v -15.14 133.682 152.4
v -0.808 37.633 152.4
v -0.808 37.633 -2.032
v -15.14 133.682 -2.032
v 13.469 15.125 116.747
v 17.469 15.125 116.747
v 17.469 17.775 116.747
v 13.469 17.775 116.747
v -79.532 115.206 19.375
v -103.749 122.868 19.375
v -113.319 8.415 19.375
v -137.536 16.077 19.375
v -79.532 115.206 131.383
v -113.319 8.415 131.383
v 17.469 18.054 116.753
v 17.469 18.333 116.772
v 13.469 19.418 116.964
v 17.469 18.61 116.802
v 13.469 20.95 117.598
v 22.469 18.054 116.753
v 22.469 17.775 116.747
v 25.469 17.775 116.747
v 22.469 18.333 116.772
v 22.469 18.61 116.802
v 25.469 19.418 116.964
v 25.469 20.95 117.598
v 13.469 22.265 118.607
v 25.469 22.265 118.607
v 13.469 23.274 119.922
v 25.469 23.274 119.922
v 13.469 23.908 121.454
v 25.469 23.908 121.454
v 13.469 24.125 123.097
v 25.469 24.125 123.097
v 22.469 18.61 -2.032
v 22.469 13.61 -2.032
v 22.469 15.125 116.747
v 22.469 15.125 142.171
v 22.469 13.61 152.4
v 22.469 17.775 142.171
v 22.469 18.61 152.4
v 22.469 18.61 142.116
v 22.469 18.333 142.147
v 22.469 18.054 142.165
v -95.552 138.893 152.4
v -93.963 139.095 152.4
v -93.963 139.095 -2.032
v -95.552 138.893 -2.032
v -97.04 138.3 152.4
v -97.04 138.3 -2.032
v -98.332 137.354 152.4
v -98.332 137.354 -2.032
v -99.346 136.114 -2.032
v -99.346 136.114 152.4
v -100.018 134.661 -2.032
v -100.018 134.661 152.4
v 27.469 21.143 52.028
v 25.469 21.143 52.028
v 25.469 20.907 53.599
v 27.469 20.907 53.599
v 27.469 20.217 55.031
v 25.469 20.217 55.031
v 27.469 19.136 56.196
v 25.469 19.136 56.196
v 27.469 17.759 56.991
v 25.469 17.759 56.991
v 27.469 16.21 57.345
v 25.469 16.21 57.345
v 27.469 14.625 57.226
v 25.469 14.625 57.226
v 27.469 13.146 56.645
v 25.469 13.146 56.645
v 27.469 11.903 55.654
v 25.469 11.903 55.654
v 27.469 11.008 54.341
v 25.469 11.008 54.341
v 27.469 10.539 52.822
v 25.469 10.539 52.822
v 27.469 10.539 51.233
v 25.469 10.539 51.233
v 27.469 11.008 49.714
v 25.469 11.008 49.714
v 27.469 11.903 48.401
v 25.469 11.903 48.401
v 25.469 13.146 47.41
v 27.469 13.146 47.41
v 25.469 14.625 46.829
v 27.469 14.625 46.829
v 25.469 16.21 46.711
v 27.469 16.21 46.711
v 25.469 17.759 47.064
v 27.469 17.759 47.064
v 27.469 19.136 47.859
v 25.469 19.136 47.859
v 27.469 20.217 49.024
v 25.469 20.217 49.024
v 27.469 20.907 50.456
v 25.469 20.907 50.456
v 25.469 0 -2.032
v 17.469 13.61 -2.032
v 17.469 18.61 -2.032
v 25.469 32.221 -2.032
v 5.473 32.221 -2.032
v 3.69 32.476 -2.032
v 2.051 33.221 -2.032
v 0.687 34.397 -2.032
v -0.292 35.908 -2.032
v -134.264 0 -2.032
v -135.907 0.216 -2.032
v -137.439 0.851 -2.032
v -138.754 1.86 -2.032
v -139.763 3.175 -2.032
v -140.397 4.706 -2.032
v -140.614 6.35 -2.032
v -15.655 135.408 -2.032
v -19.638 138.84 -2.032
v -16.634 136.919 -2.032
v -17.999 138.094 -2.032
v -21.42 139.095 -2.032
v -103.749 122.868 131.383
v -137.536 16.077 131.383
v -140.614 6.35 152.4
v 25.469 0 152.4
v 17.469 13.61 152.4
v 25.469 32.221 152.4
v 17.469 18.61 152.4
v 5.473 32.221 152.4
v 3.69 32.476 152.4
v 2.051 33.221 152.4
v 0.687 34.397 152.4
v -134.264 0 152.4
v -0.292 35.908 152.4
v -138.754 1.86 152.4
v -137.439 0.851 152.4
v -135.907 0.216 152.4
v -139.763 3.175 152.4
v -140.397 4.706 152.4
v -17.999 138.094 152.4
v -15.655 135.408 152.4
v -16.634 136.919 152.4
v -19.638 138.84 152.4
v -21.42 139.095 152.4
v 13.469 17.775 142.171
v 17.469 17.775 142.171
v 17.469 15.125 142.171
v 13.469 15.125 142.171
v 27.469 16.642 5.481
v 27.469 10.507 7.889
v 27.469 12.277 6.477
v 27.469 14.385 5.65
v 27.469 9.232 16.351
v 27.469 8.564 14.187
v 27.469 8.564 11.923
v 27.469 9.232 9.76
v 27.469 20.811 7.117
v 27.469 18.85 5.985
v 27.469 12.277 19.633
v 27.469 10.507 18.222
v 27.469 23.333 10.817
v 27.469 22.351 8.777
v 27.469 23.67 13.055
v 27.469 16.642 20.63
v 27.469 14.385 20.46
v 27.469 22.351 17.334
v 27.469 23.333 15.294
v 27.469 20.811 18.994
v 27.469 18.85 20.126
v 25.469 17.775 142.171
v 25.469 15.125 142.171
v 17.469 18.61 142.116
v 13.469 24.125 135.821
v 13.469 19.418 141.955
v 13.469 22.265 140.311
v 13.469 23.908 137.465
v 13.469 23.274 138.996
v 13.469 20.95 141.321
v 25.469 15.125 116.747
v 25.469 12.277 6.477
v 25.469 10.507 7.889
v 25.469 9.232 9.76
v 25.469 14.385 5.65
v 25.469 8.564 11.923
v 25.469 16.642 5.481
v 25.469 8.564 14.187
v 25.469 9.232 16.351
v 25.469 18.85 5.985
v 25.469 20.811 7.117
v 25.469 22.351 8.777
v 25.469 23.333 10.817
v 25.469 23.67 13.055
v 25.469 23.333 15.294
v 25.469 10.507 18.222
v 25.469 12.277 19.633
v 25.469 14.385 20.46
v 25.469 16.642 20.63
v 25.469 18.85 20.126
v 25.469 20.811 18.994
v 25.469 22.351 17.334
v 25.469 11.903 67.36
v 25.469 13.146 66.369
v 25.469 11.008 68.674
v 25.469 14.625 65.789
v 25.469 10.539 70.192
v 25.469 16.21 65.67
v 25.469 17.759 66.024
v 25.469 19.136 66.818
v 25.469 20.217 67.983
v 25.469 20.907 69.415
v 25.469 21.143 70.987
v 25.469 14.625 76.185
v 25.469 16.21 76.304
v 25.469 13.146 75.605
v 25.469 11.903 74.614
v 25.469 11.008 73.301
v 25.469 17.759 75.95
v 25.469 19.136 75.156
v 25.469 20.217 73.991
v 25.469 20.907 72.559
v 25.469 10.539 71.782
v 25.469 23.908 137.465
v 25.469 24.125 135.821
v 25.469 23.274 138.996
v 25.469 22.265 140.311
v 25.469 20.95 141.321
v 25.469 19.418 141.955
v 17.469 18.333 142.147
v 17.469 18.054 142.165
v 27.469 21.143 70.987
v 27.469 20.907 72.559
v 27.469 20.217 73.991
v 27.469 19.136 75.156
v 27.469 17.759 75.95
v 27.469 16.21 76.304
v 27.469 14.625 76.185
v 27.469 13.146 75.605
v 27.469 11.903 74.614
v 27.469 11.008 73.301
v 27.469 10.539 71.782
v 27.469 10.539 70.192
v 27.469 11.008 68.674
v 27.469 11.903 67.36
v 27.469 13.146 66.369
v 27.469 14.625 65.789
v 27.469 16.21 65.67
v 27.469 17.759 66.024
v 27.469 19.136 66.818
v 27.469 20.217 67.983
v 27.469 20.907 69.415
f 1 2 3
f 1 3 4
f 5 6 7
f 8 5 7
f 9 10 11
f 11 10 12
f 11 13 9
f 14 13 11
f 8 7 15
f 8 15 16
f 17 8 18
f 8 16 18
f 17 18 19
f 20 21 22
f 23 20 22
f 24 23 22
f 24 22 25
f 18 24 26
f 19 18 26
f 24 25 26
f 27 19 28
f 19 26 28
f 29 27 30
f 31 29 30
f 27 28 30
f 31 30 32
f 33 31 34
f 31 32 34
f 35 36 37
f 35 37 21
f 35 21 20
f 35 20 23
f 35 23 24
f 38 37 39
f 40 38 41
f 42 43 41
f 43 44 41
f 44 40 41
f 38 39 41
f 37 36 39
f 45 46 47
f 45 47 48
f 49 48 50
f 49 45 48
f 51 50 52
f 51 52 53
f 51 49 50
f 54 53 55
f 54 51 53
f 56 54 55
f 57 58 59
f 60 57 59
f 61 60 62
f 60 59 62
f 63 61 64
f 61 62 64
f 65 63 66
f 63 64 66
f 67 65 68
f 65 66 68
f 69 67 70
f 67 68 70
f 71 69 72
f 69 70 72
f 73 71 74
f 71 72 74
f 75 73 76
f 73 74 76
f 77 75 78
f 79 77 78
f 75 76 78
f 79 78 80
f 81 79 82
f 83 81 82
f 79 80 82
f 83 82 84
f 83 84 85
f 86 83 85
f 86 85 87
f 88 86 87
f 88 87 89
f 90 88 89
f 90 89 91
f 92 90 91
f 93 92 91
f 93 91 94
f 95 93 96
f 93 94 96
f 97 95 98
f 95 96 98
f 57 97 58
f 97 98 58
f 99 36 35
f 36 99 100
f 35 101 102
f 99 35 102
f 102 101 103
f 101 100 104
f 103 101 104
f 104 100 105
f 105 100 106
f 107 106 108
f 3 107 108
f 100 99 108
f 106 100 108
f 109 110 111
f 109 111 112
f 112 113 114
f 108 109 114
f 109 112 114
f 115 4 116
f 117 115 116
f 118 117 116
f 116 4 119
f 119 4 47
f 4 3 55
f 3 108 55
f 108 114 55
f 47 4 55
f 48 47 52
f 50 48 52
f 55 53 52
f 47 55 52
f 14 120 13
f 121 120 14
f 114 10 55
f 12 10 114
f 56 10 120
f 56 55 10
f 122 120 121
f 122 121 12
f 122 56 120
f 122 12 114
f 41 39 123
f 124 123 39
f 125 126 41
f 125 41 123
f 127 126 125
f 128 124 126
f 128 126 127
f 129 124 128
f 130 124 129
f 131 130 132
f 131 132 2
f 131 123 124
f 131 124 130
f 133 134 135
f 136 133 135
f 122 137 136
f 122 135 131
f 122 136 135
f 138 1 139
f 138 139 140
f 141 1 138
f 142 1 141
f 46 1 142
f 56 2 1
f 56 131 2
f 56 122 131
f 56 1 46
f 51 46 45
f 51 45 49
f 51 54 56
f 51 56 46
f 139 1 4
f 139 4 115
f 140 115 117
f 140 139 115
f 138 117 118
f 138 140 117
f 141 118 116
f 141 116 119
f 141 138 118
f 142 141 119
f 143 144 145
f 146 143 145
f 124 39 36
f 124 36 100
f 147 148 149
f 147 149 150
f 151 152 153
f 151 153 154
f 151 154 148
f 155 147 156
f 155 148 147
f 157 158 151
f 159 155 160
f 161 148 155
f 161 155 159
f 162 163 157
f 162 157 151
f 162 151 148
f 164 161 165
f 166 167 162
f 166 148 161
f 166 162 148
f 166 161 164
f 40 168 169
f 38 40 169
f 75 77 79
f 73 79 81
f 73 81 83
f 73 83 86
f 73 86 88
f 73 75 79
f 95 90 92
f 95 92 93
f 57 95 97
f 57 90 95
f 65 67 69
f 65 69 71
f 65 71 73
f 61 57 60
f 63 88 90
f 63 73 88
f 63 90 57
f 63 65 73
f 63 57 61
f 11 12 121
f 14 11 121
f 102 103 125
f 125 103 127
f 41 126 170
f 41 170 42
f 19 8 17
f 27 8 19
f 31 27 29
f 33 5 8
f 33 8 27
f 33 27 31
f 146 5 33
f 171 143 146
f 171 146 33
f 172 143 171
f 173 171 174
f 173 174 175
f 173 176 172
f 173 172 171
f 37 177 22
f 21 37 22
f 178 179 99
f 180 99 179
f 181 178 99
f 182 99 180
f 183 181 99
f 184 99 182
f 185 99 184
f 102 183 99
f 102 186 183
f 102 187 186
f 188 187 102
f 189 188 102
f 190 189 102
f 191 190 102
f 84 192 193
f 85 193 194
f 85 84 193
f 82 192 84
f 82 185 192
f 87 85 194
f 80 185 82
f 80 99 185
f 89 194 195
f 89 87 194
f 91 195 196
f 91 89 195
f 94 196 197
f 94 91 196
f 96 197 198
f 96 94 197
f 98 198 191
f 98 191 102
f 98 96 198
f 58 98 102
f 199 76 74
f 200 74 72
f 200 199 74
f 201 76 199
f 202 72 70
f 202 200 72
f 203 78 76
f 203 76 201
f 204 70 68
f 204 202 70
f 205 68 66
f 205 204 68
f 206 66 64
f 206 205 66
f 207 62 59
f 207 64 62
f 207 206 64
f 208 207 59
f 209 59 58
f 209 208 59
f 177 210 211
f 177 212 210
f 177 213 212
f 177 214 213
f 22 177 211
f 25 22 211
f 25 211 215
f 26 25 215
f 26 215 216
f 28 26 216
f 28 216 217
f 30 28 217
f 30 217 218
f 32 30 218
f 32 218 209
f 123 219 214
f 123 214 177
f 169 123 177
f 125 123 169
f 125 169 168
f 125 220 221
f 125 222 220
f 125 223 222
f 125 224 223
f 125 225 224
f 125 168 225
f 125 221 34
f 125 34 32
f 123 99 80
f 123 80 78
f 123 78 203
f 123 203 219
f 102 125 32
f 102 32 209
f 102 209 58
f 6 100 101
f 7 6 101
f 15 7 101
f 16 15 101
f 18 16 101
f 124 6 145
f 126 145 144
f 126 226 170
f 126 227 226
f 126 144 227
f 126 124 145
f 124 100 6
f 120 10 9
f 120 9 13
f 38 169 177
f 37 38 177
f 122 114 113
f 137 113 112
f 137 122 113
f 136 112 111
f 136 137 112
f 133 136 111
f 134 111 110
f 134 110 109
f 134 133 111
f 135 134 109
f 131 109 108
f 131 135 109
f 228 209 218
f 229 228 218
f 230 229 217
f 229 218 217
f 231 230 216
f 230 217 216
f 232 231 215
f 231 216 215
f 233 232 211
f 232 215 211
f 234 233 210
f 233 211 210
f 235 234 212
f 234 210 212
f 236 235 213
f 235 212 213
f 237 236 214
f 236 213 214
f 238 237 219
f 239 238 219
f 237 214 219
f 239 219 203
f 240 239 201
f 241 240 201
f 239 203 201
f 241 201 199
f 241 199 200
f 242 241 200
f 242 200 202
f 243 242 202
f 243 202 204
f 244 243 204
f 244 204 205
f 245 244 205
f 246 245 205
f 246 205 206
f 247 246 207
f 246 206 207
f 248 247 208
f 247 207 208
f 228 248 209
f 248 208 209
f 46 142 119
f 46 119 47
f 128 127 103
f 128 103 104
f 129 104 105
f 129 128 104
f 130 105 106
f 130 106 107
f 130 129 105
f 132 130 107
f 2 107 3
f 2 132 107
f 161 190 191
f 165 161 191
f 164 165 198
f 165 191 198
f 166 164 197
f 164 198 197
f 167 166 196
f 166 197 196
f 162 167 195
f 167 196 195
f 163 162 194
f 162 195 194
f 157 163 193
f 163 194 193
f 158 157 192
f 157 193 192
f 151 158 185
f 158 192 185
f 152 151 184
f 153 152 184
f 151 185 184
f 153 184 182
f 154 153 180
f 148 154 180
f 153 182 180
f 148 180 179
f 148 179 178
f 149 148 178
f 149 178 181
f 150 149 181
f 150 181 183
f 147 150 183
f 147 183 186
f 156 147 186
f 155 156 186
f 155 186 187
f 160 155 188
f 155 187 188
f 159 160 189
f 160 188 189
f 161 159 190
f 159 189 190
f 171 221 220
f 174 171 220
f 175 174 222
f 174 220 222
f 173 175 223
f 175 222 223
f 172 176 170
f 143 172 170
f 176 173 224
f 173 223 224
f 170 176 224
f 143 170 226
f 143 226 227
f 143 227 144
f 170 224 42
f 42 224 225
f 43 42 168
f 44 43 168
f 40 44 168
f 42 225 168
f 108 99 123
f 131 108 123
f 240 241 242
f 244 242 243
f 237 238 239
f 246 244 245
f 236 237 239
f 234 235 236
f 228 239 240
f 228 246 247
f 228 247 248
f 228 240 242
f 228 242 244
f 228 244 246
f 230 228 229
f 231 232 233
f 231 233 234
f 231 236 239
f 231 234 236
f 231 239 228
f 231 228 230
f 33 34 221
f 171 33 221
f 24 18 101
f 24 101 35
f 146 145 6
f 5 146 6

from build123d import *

# Parameters (mm, degrees)
F1_DEPTH  = 152.4
F3_DEPTH  = 154.432
F4_W      = 32.220531255
F4_H      = 154.432
F5_DEPTH  = 3
F6_R      = 7.5954813499
F6_R_2    = 5.3319461193
F7_DEPTH  = 2
F9_DEPTH  = 12
F10_W     = 112.0086535811
F10_H     = 112.0086535811
F11_DEPTH = 25.4


with BuildPart() as f1:
    # F0 (on Top) → F1 (new body)
    with BuildSketch(Plane.XY):
        with BuildLine():
            Line((-134.2638241291, 0), (0, 0))
            Line((0, 0), (22.4686227739, 0))
            Line((22.4686227739, 0), (22.4686227739, 6.3499999233))
            Line((22.4686227739, 6.3499999233), (0, 6.3499999233))
            Line((0, 6.35), (-128.7519809926, 6.35))
            ThreePointArc((-128.7519809926, 6.35), (-131.8256525814, 7.9086353107), (-132.3845036601, 11.3092950319))
            Line((-132.3845036601, 11.3092950319), (-94.8052258673, 130.0843481086))
            ThreePointArc((-94.8052258673, 130.0843481086), (-93.4240678892, 132.0087246655), (-91.1727031999, 132.7450530767))
            Line((-91.1727031999, 132.7450530767), (-24.7038652326, 132.7450530767))
            ThreePointArc((-24.7038652326, 132.7450530767), (-22.2165192123, 131.8210901131), (-20.9355855807, 129.4973416727))
            Line((-20.9355855807, 129.4973416727), (-7.0881516681, 36.6962359353))
            ThreePointArc((-7.0881516681, 36.6962359353), (-2.8183728961, 28.9504078005), (5.4727805049, 25.870531255))
            Line((5.4727805049, 25.870531255), (22.4686227739, 25.870531255))
            Line((22.4686227739, 25.870531255), (22.4686227739, 32.220531255))
            Line((22.4686227739, 32.220531255), (5.4727805049, 32.220531255))
            ThreePointArc((5.4727805049, 32.220531255), (1.3272038044, 33.7604695277), (-0.8076855816, 37.6333835952))
            Line((-0.8076855816, 37.6333835952), (-15.1397308432, 133.6822007366))
            ThreePointArc((-15.1397308432, 133.6822007366), (-17.2746202291, 137.555114804), (-21.4201969297, 139.0950530767))
            Line((-21.4201969297, 139.0950530767), (-93.9634045544, 139.0950530767))
            ThreePointArc((-93.9634045544, 139.0950530767), (-97.7156790366, 137.867839058), (-100.0176090002, 134.6605447965))
            Line((-100.0176090002, 134.6605447965), (-140.6138241291, 6.35))
            ThreePointArc((-140.6138241291, 6.35), (-138.7539521896, 1.8598719395), (-134.2638241291, 0))
        make_face()
    extrude(amount=F1_DEPTH)

    # F2 (on face) → F3 (join)
    with BuildSketch(Plane.XY.offset(152.4)):
        with BuildLine():
            Line((-134.2638241291, 0), (0, 0))
            Line((0, 0), (22.4686227739, 0))
            Line((22.4686227739, 0), (22.4686227739, 13.6102656275))
            Line((22.4686227739, 13.6102656275), (17.4686227739, 13.6102656275))
            Line((17.4686227739, 13.6102656275), (17.4686227739, 18.6102656275))
            Line((17.4686227739, 18.6102656275), (22.4686227739, 18.6102656275))
            Line((22.4686227739, 18.6102656275), (22.4686227739, 32.220531255))
            Line((22.4686227739, 32.220531255), (5.4727805049, 32.220531255))
            ThreePointArc((5.4727805049, 32.220531255), (1.3272038044, 33.7604695277), (-0.8076855816, 37.6333835952))
            Line((-0.8076855816, 37.6333835952), (-15.1397308432, 133.6822007366))
            ThreePointArc((-15.1397308432, 133.6822007366), (-17.2746202291, 137.555114804), (-21.4201969297, 139.0950530767))
            Line((-21.4201969297, 139.0950530767), (-93.9634045544, 139.0950530767))
            ThreePointArc((-93.9634045544, 139.0950530767), (-97.7156790366, 137.867839058), (-100.0176090002, 134.6605447965))
            Line((-100.0176090002, 134.6605447965), (-140.6138241291, 6.35))
            ThreePointArc((-140.6138241291, 6.35), (-138.7539521896, 1.8598719395), (-134.2638241291, 0))
        make_face()
    extrude(amount=-F3_DEPTH)

    # F4 (on face) → F5 (join)
    with BuildSketch(Plane.YZ.offset(22.4686227739)):
        with Locations((16.1102656275, 75.184)):
            Rectangle(F4_W, F4_H)
    extrude(amount=F5_DEPTH)

    # F6 (on face) → F7 (join)
    with BuildSketch(Plane.YZ.offset(25.4686227739)):
        with Locations((16.0748194903, 13.0553431809)):
            Circle(F6_R)
        with Locations((15.8114936203, 52.0275905728)):
            Circle(F6_R_2)
        with Locations((15.8114936203, 70.9870681167)):
            Circle(F6_R_2)
    extrude(amount=F7_DEPTH)

    # F8 (on face) → F9 (cut)
    with BuildSketch(Plane.YZ.offset(25.4686227739)):
        with BuildLine():
            Line((17.7747905254, 142.1712523777), (15.1247905254, 142.1712523777))
            Line((15.1247905254, 142.1712523777), (15.1247905254, 116.7472228408))
            Line((15.1247905254, 116.7472228408), (17.7747905254, 116.7472228408))
            ThreePointArc((17.7747905254, 116.7472228408), (22.264918586, 118.6070947803), (24.1247905254, 123.0972228408))
            Line((24.1247905254, 123.0972228408), (24.1247905254, 135.8212523777))
            ThreePointArc((24.1247905254, 135.8212523777), (22.264918586, 140.3113804383), (17.7747905254, 142.1712523777))
        make_face()
    extrude(amount=-F9_DEPTH, mode=Mode.SUBTRACT)

    # F10 (on face) → F11 (cut)
    with BuildSketch(Plane(origin=(-129.6450638104, 41.0184440351, 0), x_dir=(-0.3016522393, -0.953418023, 0), z_dir=(-0.953418023, 0.3016522393, 0))):
        with Locations((-29.8443771899, 75.3790028393)):
            Rectangle(F10_W, F10_H)
    extrude(amount=-F11_DEPTH, mode=Mode.SUBTRACT)


solid = f1.part
